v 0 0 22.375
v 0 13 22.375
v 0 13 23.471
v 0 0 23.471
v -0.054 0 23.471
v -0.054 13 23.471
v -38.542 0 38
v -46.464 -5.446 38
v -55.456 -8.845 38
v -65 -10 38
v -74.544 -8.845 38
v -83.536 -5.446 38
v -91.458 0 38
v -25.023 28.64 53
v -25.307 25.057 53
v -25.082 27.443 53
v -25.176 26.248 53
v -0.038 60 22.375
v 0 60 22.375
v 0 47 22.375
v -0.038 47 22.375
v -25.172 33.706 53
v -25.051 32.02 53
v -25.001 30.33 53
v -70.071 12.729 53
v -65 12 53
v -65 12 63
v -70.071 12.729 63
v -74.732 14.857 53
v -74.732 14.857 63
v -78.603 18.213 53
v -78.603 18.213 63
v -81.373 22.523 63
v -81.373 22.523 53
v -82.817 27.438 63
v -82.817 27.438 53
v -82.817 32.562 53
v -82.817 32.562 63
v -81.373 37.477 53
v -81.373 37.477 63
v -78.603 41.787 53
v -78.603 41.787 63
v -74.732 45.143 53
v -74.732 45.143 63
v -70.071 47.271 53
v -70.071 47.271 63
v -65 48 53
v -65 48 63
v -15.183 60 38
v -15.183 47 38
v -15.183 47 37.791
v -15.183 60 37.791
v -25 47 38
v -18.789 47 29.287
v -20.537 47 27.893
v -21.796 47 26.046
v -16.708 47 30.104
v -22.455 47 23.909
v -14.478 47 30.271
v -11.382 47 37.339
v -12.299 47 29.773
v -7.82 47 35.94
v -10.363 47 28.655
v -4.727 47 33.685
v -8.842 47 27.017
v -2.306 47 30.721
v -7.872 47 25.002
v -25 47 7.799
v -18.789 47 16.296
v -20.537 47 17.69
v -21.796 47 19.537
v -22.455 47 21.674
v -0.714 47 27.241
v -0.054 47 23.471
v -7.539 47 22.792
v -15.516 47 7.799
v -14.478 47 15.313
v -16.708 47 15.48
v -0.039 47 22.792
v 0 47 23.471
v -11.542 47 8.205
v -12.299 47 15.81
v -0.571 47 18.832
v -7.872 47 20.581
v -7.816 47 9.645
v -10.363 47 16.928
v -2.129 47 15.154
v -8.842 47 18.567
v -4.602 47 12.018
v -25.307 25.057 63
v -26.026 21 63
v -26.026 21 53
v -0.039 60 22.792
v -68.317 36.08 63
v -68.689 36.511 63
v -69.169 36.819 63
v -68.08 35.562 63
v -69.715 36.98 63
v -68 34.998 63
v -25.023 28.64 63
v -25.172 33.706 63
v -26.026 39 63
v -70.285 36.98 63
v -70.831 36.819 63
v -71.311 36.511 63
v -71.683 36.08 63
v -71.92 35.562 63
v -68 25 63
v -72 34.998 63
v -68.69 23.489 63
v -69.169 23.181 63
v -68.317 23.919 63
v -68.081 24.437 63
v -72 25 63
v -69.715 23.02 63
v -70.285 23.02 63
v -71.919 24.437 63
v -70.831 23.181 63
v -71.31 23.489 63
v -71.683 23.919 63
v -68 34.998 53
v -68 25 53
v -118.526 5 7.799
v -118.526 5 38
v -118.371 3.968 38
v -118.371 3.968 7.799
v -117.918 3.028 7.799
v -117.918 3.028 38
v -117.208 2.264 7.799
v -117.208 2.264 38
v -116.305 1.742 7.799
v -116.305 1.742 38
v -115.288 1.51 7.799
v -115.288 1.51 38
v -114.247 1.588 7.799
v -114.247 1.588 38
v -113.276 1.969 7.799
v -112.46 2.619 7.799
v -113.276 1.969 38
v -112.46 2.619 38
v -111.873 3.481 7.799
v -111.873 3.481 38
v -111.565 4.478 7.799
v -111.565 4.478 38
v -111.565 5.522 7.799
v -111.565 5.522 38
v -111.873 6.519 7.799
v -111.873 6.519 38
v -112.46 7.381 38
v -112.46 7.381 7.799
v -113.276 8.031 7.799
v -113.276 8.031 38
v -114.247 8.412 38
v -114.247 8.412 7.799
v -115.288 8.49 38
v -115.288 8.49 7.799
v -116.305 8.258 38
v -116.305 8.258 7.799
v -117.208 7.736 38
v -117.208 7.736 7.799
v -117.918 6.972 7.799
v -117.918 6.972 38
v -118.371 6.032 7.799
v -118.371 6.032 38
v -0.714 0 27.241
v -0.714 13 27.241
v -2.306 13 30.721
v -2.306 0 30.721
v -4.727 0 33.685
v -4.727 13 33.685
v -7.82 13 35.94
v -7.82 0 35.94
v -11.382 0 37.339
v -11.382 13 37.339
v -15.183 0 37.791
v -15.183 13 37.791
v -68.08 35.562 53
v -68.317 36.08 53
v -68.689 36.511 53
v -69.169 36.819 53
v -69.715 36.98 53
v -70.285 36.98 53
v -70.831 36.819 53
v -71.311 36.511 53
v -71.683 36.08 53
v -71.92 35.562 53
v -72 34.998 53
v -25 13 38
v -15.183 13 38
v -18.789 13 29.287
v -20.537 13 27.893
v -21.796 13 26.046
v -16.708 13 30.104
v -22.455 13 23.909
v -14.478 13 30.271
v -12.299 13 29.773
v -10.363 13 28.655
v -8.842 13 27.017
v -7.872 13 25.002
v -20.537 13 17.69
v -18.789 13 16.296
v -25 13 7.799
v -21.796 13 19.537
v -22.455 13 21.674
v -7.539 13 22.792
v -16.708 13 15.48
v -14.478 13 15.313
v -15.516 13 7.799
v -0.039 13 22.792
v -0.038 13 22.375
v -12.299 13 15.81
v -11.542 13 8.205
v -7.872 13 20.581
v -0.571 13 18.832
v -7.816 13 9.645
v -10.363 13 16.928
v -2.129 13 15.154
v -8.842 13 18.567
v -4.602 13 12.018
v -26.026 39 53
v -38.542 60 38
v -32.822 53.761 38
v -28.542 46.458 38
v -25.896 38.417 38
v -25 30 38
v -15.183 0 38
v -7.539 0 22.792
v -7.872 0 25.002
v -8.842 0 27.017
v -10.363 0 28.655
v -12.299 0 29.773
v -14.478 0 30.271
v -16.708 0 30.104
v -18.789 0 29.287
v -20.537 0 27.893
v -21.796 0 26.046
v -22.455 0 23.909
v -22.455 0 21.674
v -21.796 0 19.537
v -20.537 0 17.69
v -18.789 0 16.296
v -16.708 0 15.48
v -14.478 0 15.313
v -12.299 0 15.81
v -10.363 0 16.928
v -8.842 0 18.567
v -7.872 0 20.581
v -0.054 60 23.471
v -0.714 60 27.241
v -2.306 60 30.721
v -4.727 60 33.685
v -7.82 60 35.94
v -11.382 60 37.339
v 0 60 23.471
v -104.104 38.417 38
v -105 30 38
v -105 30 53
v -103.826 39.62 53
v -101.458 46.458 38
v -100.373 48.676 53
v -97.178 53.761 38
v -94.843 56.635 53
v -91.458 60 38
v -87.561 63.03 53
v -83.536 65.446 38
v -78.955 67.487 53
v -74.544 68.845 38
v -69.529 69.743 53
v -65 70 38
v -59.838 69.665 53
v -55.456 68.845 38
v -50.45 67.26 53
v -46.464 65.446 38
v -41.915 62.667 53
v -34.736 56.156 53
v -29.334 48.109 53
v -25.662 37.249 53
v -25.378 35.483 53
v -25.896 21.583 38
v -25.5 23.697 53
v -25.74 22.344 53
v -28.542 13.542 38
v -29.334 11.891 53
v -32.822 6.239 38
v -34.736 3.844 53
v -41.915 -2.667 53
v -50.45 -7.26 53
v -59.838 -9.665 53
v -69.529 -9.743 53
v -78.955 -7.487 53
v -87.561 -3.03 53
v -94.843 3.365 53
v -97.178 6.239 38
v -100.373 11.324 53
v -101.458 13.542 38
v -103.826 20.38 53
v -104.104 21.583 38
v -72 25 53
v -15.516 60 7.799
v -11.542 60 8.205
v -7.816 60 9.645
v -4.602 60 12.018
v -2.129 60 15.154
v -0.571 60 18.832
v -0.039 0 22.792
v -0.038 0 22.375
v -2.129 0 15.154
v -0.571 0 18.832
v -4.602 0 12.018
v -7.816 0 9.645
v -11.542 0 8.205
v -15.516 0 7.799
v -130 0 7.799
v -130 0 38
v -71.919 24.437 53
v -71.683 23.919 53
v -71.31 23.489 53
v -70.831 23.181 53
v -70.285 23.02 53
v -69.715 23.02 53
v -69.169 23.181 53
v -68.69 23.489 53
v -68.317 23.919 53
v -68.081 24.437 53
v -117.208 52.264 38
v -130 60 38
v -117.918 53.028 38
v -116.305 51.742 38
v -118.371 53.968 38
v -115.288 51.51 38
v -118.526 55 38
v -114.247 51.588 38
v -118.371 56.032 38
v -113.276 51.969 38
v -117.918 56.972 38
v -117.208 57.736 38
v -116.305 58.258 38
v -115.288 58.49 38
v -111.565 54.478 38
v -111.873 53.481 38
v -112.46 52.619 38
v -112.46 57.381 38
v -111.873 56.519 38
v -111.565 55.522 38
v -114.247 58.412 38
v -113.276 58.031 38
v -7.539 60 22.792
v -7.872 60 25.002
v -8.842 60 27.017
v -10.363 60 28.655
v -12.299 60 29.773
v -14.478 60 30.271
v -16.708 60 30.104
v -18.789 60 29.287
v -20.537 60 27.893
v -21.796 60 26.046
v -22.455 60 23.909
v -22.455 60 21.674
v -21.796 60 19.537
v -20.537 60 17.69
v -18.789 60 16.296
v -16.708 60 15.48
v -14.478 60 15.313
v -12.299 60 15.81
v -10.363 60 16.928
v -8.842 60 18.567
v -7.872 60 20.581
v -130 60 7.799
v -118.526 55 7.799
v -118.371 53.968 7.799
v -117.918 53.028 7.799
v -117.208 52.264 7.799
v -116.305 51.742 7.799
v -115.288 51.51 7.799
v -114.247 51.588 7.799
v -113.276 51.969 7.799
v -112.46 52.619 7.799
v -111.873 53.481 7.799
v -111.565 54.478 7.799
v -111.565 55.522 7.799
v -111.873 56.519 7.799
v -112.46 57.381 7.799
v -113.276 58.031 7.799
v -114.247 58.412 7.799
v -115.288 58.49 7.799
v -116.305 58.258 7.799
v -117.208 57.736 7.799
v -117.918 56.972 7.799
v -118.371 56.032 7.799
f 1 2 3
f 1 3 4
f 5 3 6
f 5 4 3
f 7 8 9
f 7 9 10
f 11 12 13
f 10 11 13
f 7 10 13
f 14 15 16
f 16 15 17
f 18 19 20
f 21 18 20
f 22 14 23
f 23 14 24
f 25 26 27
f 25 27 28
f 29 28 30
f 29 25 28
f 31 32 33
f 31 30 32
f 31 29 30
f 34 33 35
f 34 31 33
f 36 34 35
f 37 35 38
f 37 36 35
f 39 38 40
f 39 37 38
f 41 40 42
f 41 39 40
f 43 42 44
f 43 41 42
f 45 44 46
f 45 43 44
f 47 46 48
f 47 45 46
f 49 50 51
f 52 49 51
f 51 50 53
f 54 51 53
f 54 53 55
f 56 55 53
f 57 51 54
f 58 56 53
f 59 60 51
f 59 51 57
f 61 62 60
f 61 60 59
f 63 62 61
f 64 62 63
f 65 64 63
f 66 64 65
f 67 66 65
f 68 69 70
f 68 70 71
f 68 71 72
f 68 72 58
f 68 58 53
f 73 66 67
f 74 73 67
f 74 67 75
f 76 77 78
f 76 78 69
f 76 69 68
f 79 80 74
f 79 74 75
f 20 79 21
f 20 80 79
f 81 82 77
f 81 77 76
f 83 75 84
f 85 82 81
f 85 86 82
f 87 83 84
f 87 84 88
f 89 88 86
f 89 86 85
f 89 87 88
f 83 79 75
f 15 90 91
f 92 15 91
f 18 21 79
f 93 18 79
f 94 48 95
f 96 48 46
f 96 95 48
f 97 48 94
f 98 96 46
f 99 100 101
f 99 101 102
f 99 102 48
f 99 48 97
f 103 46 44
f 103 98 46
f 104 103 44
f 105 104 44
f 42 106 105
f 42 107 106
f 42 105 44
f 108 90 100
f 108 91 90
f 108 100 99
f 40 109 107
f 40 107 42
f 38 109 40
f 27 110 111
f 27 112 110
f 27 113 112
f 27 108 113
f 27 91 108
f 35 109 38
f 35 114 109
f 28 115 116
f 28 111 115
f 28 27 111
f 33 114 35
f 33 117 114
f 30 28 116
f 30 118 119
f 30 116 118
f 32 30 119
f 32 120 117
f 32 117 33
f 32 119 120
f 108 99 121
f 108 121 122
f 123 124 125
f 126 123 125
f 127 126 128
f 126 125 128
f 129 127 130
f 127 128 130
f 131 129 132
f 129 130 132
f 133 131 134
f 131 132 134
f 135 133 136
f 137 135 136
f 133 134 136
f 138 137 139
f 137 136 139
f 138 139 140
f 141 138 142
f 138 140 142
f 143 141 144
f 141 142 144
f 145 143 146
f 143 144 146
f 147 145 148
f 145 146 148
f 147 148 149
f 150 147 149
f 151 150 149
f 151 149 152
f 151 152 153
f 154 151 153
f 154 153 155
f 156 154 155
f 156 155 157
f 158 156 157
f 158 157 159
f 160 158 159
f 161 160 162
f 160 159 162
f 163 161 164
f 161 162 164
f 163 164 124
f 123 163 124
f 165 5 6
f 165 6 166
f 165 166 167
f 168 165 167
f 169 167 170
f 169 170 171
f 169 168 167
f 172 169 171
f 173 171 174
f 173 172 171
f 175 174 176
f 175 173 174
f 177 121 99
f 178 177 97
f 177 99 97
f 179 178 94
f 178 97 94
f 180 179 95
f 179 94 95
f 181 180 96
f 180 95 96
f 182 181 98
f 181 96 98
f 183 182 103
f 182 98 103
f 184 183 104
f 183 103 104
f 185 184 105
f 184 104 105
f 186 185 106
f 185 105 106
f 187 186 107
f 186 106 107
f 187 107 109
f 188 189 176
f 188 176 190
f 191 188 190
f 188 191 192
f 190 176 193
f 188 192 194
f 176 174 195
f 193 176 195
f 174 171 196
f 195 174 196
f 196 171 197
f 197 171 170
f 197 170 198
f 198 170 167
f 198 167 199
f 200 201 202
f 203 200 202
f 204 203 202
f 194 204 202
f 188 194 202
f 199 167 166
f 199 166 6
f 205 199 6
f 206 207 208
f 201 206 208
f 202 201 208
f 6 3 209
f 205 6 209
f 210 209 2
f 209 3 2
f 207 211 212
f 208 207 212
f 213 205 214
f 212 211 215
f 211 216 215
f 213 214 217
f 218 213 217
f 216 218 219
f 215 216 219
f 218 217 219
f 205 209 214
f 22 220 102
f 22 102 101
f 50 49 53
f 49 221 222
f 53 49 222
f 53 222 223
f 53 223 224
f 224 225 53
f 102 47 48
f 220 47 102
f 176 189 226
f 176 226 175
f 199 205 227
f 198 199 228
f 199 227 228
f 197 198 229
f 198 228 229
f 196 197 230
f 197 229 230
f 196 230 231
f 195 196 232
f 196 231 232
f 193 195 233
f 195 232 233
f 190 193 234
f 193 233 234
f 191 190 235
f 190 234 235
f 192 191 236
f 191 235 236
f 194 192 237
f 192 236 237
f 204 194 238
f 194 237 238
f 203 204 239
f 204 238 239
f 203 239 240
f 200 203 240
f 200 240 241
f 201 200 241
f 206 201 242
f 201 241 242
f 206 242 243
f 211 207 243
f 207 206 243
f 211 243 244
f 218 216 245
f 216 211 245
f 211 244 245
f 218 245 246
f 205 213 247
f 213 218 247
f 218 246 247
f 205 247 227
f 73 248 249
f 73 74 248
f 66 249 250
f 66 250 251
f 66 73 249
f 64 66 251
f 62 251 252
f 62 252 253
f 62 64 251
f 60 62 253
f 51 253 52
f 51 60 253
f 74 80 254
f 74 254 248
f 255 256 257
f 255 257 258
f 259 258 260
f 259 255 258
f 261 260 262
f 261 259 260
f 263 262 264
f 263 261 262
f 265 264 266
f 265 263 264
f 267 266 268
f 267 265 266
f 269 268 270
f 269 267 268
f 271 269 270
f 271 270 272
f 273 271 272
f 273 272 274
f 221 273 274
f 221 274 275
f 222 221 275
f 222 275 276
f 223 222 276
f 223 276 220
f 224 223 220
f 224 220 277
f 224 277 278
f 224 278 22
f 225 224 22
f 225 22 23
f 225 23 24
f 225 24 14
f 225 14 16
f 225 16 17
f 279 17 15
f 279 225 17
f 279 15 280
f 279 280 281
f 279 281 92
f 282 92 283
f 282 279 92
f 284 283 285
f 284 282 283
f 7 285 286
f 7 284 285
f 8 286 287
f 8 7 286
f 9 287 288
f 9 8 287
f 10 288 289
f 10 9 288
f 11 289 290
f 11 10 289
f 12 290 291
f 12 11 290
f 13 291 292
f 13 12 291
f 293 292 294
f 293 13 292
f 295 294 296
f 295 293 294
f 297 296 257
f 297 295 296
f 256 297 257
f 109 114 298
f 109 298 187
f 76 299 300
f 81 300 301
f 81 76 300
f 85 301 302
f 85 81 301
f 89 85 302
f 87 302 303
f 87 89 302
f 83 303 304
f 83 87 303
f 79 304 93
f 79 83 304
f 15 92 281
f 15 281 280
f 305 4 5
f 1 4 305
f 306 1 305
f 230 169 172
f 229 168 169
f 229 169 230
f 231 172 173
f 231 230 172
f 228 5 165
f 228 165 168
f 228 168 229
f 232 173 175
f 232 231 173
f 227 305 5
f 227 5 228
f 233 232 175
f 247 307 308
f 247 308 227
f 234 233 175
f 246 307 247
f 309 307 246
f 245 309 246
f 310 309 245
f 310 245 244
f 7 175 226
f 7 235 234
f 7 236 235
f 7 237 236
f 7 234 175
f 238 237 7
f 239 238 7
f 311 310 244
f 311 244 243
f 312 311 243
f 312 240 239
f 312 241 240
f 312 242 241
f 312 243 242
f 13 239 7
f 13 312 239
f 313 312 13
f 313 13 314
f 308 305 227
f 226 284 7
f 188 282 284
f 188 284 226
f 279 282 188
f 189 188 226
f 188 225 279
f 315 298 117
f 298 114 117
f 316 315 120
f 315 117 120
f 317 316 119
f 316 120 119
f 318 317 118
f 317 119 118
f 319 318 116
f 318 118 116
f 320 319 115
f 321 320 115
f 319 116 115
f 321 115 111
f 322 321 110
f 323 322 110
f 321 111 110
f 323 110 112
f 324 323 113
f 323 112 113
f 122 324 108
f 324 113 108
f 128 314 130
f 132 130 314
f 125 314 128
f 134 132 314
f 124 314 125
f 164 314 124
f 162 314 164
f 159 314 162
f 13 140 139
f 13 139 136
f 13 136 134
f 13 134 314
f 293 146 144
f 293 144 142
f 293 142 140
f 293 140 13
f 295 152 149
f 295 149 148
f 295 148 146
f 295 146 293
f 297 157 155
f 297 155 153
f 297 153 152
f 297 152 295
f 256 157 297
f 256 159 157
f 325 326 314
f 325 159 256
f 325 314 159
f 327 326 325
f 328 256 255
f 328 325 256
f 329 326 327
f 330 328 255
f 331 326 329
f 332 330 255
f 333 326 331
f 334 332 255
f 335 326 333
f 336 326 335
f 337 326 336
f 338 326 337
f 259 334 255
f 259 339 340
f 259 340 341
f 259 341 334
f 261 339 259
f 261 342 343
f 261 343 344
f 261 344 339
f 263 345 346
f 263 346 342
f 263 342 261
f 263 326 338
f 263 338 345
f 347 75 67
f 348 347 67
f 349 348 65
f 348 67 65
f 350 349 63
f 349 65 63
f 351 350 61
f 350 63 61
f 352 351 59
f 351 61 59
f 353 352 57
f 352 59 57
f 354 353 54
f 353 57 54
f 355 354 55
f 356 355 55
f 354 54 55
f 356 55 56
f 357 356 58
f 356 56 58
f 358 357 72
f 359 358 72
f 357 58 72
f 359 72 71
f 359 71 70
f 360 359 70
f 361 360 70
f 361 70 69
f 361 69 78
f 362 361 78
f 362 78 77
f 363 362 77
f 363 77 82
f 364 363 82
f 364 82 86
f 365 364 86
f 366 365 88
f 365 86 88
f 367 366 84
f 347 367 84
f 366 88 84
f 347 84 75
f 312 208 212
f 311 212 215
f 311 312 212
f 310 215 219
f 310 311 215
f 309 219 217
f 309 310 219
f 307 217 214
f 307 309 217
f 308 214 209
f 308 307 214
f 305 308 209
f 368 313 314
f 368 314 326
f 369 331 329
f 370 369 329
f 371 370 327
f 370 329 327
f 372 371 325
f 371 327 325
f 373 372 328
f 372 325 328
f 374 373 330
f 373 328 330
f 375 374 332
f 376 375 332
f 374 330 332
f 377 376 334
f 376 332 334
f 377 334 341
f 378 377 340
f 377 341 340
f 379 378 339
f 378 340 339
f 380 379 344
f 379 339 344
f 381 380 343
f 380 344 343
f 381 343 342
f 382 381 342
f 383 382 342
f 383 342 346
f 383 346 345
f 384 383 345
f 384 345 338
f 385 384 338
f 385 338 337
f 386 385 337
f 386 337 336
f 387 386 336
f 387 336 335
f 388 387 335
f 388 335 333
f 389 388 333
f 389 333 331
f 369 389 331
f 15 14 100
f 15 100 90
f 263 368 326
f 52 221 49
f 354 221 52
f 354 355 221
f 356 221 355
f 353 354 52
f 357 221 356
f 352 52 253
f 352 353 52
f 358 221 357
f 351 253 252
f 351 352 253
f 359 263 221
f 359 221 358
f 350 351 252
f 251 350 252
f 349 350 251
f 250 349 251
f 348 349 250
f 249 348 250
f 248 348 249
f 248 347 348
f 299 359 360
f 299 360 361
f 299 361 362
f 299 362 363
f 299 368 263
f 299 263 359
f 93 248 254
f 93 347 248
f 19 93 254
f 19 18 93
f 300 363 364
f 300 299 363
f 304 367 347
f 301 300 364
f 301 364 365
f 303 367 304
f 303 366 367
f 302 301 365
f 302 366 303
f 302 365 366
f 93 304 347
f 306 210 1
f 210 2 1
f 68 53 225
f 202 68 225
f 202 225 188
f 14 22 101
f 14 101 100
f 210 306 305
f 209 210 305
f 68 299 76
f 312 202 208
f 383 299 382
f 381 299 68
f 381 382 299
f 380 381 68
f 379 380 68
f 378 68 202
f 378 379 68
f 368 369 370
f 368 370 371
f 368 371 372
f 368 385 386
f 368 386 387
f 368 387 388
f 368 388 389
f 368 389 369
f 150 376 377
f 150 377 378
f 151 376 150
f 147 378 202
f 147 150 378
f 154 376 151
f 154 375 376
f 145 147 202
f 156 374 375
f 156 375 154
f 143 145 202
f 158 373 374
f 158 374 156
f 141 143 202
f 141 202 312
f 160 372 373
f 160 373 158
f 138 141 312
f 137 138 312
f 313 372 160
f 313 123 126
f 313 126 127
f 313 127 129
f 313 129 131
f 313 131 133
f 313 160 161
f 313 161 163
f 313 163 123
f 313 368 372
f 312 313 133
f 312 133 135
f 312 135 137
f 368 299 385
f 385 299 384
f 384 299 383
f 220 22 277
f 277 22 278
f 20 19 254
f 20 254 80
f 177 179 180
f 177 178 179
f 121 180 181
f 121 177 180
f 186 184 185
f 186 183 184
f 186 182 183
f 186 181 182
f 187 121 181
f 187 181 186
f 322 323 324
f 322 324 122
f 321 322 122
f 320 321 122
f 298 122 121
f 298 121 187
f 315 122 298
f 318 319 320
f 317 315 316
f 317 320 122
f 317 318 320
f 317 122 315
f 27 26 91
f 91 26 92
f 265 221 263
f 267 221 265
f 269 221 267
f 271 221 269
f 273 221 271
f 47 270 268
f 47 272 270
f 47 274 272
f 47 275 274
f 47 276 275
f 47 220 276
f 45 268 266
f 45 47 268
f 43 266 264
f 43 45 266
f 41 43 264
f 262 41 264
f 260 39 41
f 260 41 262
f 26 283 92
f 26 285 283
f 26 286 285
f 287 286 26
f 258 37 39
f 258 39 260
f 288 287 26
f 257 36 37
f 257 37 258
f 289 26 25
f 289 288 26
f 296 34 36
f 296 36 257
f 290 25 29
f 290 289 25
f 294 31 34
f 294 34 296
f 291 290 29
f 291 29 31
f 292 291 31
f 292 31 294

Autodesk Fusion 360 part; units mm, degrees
sketch "Sketch1" plane through (0, 0, 0) normal (0, 0, 1) x (1, 0, 0)
  line L0 (0, 0) -> (-130, 0)
  line L1 (-130, 0) -> (-130, 60)
  line L2 (-130, 60) -> (0, 60)
  line L3 (0, 60) -> (0, 0)
  dimension "d1" = 130
  dimension "d2" = 60
extrude "Extrude1" add sketch "Sketch1" along normal blind 38
sketch "Sketch2" plane through (0, 0, 0) normal (1, 0, 0) x (0, 1, 0)
  line L0 (0, 0) -> (60, 0)
  line L1 (60, 0) -> (60, 38)
  line L2 (60, 38) -> (0, 38)
  line L3 (0, 38) -> (0, 0)
  line L4 (30, 38) -> (13, 38)
  line L5 (30, 38) -> (47, 38)
  line L6 (13, 38) -> (13, 0)
  line L7 (13, 0) -> (45, 0)
  line L8 (45, 0) -> (47, 0)
  line L9 (47, 38) -> (47, 0)
  dimension "d5" = 17
  dimension "d6" = 17
  dimension "d7" = 2
extrude "Extrude2" cut sketch "Sketch2" against normal blind 20 contours L0 L2 L4 L5 L6 L7 L8 L9
sketch "Sketch3" plane through (0, 0, 38) normal (0, 0, 1) x (-1, 0, 0)
  line L0 (20, -47) -> (0, -47)
  line L1 (0, -47) -> (0, -60)
  line L2 (0, -60) -> (130, -60)
  line L3 (130, -60) -> (130, 0)
  line L4 (130, 0) -> (0, 0)
  line L5 (0, 0) -> (0, -13)
  line L6 (0, -13) -> (20, -13)
  line L7 (20, -13) -> (20, -47)
  line L8 (130, -30) -> (0, -30)
  line L9 (65, -60) -> (65, 0)
  circle A0 centre (65, -30) radius 40
  dimension "d10" = 80
extrude "Extrude3" add sketch "Sketch3" along normal blind 15 contours L4 L8 L9 A0 | L2 L8 L9 A0 | L2 A0 | L4 L8 L9 A0 | L2 L8 L9 A0 | L4 A0
sketch "Sketch4" plane through (0, 0, 0) normal (0, -1, 0) x (1, 0, 0)
  line L0 (-130, 0) -> (0, 0)
  line L1 (0, 0) -> (0, 38)
  line L2 (0, 38) -> (-38.5425, 38)
  line L3 (-38.5425, 38) -> (-91.4575, 38)
  line L4 (-91.4575, 38) -> (-130, 38)
  line L5 (-130, 38) -> (-130, 0)
  circle A0 centre (-15.0389, 22.7916) radius 7.5
  circle A1 centre (-15.0389, 22.7916) radius 15
  line L6 (-14.5606, 7.7992) -> (-51.278, 7.7992)
  line L7 (-51.278, 7.7992) -> (-130, 7.7992)
  line L8 (-130, 7.7992) -> (-130, 0)
  line L9 (-130, 0) -> (0, 0)
  line L10 (0, 0) -> (-0.0389, 22.8172)
  dimension "d13" = 15
  dimension "d14" = 30
extrude "Extrude4" cut sketch "Sketch4" against normal blind 85 contours L0 L5 A1 L6 L7 L8 L9 L10 | A0
sketch "Sketch5" plane through (0, 0, 0) normal (1, 0, 0) x (0, 1, 0)
  line L0 (13, 0) -> (13, 38)
  line L1 (13, 38) -> (0, 38)
  line L2 (0, 38) -> (0, 0)
  line L3 (0, 0) -> (13, 0)
  line L4 (0, 0) -> (62.2368, 0)
  line L5 (62.2368, 0) -> (62.2368, 22.3752)
  line L6 (62.2368, 22.3752) -> (0, 22.3752)
  line L7 (0, 22.3752) -> (0, 0)
extrude "Extrude5" cut sketch "Sketch5" against normal blind 0.04 contours L0 L2 L3 L4 L6 L7 | L0 L4 L5 L6
sketch "Sketch6" plane through (-20, 0, 0) normal (1, 0, 0) x (0, 1, 0)
  line L0 (13, 28.4163) -> (47, 28.4163)
  line L1 (47, 28.4163) -> (47, 38)
  line L2 (47, 38) -> (13, 38)
  line L3 (13, 38) -> (13, 28.4163)
  line L4 (13, 38) -> (47, 38)
  line L5 (47, 38) -> (47, 8)
  line L6 (47, 8) -> (13, 8)
  line L7 (13, 8) -> (13, 38)
extrude "Extrude6" cut sketch "Sketch6" against normal blind 15
sketch "Sketch7" plane through (0, 0, 8) normal (0, 0, 1) x (-1, 0, 0)
  line L0 (20, -13) -> (20, -47)
  line L1 (20, -47) -> (35, -47)
  line L2 (35, -47) -> (35, -13)
  line L3 (35, -13) -> (20, -13)
extrude "Extrude7" cut sketch "Sketch7" against normal blind 20
extrude "Extrude8" add 1 faces at (-35, 24.3333, 24.7385) along direction (1, 0, 0) blind 10
sketch "Sketch8" plane through (0, 0, 38) normal (0, 0, 1) x (-1, 0, 0)
  arc A0 (91.4575, -60) -> (91.4575, 0) centre (65, -30) ccw
  line L0 (91.4575, -60) -> (130, -60)
  line L1 (130, -60) -> (130, 0)
  line L2 (130, 0) -> (91.4575, 0)
  line L3 (130, -30) -> (113, -30)
  line L4 (113, -30) -> (105, -30)
  line L5 (115.0261, -30) -> (115.0261, -55)
  line L6 (115.0261, -30) -> (115.0261, -5)
  circle A1 centre (115.0261, -5) radius 3.5
  circle A2 centre (115.0261, -55) radius 3.5
  dimension "d25" = 25
  dimension "d26" = 25
  dimension "d27" = 7
  dimension "d28" = 7
extrude "Extrude9" cut sketch "Sketch8" against normal blind 80 contours A2 | A1
sketch "Sketch9" plane through (0, 0, 0) normal (0, -1, 0) x (1, 0, 0)
  line L0 (-0.0382, 22.3752) -> (0, 22.3752)
  line L1 (0, 22.3752) -> (0, 38)
  line L2 (0, 38) -> (-38.5425, 38)
  line L3 (-38.5425, 38) -> (-91.4575, 38)
  line L4 (-91.4575, 38) -> (-130, 38)
  line L5 (-130, 38) -> (-130, 7.7992)
  line L6 (-130, 7.7992) -> (-15.5172, 7.7992)
  arc A0 (-15.5172, 7.7992) -> (-0.0389, 22.8172) centre (-15.0389, 22.7916) ccw
  line L7 (-0.0389, 22.8172) -> (-0.0382, 22.3752)
  circle A1 centre (-15.0389, 22.7916) radius 7.5
  circle A2 centre (-15.0389, 22.7916) radius 15
  line L8 (-15.1827, 38) -> (0, 40)
  line L9 (0, 40) -> (2, 37)
  line L10 (2, 37) -> (2, 23.4709)
  line L11 (2, 23.4709) -> (-0.0543, 23.4709)
  line L12 (-15.1827, 38) -> (-15.1827, 37.7909)
  dimension "d31" = 30
extrude "Extrude10" cut sketch "Sketch9" against normal blind 75 contours L1 L2 A2 L11 L12 | L1 L2 L8 L9 L10 L11
sketch "Sketch10" plane through (0, 0, 53) normal (0, 0, 1) x (-1, 0, 0)
  circle A0 centre (65, -30) radius 40
  circle A1 centre (65, -30) radius 18
  line L0 (65, -30) -> (65, -48)
  line L1 (65, -30) -> (65, -12)
  line L2 (65, -12) -> (65, -21)
  line L3 (65, -12) -> (65, -21)
  line L4 (65, -12) -> (26.0256, -21)
  line L5 (65, -48) -> (65, -39)
  line L6 (65, -48) -> (26.0256, -39)
  line L7 (26.0256, -39) -> (25.172, -33.7058)
  line L8 (25.172, -33.7058) -> (25.0231, -28.6402)
  line L9 (25.0231, -28.6402) -> (25.3066, -25.057)
  line L10 (25.3066, -25.057) -> (26.0256, -21)
  dimension "d34" = 36
extrude "Extrude11" add sketch "Sketch10" along normal blind 10 contours A1 L4 L6 L7 L8 L9 L10 | A1 L0 L1 L2 L3 L4 L5 L6 | A1 L0 L1 L2 L3 L5
sketch "Sketch11" plane through (0, 0, 63) normal (0, 0, 1) x (-1, 0, 0)
  arc A0 (65, -48) -> (65, -12) centre (65, -30) ccw
  line L0 (65, -12) -> (26.0256, -21)
  line L1 (26.0256, -21) -> (25.3066, -25.057)
  line L2 (25.3066, -25.057) -> (25.0231, -28.6402)
  line L3 (25.0231, -28.6402) -> (25.172, -33.7058)
  line L4 (25.172, -33.7058) -> (26.0256, -39)
  line L5 (26.0256, -39) -> (65, -48)
  circle A1 centre (70, -25) radius 2
  circle A2 centre (70, -35) radius 2
  line L6 (68, -25) -> (72, -25)
  line L7 (72, -25) -> (72, -34.9977)
  line L8 (72, -34.9977) -> (68, -34.9977)
  line L9 (68, -34.9977) -> (68, -25)
  dimension "d37" = 4
extrude "Extrude12" cut sketch "Sketch11" against normal blind 10 contours A1 L6 | A1 A2 L7 L9 | A1 L6 | A2 L8 | A2 L8
